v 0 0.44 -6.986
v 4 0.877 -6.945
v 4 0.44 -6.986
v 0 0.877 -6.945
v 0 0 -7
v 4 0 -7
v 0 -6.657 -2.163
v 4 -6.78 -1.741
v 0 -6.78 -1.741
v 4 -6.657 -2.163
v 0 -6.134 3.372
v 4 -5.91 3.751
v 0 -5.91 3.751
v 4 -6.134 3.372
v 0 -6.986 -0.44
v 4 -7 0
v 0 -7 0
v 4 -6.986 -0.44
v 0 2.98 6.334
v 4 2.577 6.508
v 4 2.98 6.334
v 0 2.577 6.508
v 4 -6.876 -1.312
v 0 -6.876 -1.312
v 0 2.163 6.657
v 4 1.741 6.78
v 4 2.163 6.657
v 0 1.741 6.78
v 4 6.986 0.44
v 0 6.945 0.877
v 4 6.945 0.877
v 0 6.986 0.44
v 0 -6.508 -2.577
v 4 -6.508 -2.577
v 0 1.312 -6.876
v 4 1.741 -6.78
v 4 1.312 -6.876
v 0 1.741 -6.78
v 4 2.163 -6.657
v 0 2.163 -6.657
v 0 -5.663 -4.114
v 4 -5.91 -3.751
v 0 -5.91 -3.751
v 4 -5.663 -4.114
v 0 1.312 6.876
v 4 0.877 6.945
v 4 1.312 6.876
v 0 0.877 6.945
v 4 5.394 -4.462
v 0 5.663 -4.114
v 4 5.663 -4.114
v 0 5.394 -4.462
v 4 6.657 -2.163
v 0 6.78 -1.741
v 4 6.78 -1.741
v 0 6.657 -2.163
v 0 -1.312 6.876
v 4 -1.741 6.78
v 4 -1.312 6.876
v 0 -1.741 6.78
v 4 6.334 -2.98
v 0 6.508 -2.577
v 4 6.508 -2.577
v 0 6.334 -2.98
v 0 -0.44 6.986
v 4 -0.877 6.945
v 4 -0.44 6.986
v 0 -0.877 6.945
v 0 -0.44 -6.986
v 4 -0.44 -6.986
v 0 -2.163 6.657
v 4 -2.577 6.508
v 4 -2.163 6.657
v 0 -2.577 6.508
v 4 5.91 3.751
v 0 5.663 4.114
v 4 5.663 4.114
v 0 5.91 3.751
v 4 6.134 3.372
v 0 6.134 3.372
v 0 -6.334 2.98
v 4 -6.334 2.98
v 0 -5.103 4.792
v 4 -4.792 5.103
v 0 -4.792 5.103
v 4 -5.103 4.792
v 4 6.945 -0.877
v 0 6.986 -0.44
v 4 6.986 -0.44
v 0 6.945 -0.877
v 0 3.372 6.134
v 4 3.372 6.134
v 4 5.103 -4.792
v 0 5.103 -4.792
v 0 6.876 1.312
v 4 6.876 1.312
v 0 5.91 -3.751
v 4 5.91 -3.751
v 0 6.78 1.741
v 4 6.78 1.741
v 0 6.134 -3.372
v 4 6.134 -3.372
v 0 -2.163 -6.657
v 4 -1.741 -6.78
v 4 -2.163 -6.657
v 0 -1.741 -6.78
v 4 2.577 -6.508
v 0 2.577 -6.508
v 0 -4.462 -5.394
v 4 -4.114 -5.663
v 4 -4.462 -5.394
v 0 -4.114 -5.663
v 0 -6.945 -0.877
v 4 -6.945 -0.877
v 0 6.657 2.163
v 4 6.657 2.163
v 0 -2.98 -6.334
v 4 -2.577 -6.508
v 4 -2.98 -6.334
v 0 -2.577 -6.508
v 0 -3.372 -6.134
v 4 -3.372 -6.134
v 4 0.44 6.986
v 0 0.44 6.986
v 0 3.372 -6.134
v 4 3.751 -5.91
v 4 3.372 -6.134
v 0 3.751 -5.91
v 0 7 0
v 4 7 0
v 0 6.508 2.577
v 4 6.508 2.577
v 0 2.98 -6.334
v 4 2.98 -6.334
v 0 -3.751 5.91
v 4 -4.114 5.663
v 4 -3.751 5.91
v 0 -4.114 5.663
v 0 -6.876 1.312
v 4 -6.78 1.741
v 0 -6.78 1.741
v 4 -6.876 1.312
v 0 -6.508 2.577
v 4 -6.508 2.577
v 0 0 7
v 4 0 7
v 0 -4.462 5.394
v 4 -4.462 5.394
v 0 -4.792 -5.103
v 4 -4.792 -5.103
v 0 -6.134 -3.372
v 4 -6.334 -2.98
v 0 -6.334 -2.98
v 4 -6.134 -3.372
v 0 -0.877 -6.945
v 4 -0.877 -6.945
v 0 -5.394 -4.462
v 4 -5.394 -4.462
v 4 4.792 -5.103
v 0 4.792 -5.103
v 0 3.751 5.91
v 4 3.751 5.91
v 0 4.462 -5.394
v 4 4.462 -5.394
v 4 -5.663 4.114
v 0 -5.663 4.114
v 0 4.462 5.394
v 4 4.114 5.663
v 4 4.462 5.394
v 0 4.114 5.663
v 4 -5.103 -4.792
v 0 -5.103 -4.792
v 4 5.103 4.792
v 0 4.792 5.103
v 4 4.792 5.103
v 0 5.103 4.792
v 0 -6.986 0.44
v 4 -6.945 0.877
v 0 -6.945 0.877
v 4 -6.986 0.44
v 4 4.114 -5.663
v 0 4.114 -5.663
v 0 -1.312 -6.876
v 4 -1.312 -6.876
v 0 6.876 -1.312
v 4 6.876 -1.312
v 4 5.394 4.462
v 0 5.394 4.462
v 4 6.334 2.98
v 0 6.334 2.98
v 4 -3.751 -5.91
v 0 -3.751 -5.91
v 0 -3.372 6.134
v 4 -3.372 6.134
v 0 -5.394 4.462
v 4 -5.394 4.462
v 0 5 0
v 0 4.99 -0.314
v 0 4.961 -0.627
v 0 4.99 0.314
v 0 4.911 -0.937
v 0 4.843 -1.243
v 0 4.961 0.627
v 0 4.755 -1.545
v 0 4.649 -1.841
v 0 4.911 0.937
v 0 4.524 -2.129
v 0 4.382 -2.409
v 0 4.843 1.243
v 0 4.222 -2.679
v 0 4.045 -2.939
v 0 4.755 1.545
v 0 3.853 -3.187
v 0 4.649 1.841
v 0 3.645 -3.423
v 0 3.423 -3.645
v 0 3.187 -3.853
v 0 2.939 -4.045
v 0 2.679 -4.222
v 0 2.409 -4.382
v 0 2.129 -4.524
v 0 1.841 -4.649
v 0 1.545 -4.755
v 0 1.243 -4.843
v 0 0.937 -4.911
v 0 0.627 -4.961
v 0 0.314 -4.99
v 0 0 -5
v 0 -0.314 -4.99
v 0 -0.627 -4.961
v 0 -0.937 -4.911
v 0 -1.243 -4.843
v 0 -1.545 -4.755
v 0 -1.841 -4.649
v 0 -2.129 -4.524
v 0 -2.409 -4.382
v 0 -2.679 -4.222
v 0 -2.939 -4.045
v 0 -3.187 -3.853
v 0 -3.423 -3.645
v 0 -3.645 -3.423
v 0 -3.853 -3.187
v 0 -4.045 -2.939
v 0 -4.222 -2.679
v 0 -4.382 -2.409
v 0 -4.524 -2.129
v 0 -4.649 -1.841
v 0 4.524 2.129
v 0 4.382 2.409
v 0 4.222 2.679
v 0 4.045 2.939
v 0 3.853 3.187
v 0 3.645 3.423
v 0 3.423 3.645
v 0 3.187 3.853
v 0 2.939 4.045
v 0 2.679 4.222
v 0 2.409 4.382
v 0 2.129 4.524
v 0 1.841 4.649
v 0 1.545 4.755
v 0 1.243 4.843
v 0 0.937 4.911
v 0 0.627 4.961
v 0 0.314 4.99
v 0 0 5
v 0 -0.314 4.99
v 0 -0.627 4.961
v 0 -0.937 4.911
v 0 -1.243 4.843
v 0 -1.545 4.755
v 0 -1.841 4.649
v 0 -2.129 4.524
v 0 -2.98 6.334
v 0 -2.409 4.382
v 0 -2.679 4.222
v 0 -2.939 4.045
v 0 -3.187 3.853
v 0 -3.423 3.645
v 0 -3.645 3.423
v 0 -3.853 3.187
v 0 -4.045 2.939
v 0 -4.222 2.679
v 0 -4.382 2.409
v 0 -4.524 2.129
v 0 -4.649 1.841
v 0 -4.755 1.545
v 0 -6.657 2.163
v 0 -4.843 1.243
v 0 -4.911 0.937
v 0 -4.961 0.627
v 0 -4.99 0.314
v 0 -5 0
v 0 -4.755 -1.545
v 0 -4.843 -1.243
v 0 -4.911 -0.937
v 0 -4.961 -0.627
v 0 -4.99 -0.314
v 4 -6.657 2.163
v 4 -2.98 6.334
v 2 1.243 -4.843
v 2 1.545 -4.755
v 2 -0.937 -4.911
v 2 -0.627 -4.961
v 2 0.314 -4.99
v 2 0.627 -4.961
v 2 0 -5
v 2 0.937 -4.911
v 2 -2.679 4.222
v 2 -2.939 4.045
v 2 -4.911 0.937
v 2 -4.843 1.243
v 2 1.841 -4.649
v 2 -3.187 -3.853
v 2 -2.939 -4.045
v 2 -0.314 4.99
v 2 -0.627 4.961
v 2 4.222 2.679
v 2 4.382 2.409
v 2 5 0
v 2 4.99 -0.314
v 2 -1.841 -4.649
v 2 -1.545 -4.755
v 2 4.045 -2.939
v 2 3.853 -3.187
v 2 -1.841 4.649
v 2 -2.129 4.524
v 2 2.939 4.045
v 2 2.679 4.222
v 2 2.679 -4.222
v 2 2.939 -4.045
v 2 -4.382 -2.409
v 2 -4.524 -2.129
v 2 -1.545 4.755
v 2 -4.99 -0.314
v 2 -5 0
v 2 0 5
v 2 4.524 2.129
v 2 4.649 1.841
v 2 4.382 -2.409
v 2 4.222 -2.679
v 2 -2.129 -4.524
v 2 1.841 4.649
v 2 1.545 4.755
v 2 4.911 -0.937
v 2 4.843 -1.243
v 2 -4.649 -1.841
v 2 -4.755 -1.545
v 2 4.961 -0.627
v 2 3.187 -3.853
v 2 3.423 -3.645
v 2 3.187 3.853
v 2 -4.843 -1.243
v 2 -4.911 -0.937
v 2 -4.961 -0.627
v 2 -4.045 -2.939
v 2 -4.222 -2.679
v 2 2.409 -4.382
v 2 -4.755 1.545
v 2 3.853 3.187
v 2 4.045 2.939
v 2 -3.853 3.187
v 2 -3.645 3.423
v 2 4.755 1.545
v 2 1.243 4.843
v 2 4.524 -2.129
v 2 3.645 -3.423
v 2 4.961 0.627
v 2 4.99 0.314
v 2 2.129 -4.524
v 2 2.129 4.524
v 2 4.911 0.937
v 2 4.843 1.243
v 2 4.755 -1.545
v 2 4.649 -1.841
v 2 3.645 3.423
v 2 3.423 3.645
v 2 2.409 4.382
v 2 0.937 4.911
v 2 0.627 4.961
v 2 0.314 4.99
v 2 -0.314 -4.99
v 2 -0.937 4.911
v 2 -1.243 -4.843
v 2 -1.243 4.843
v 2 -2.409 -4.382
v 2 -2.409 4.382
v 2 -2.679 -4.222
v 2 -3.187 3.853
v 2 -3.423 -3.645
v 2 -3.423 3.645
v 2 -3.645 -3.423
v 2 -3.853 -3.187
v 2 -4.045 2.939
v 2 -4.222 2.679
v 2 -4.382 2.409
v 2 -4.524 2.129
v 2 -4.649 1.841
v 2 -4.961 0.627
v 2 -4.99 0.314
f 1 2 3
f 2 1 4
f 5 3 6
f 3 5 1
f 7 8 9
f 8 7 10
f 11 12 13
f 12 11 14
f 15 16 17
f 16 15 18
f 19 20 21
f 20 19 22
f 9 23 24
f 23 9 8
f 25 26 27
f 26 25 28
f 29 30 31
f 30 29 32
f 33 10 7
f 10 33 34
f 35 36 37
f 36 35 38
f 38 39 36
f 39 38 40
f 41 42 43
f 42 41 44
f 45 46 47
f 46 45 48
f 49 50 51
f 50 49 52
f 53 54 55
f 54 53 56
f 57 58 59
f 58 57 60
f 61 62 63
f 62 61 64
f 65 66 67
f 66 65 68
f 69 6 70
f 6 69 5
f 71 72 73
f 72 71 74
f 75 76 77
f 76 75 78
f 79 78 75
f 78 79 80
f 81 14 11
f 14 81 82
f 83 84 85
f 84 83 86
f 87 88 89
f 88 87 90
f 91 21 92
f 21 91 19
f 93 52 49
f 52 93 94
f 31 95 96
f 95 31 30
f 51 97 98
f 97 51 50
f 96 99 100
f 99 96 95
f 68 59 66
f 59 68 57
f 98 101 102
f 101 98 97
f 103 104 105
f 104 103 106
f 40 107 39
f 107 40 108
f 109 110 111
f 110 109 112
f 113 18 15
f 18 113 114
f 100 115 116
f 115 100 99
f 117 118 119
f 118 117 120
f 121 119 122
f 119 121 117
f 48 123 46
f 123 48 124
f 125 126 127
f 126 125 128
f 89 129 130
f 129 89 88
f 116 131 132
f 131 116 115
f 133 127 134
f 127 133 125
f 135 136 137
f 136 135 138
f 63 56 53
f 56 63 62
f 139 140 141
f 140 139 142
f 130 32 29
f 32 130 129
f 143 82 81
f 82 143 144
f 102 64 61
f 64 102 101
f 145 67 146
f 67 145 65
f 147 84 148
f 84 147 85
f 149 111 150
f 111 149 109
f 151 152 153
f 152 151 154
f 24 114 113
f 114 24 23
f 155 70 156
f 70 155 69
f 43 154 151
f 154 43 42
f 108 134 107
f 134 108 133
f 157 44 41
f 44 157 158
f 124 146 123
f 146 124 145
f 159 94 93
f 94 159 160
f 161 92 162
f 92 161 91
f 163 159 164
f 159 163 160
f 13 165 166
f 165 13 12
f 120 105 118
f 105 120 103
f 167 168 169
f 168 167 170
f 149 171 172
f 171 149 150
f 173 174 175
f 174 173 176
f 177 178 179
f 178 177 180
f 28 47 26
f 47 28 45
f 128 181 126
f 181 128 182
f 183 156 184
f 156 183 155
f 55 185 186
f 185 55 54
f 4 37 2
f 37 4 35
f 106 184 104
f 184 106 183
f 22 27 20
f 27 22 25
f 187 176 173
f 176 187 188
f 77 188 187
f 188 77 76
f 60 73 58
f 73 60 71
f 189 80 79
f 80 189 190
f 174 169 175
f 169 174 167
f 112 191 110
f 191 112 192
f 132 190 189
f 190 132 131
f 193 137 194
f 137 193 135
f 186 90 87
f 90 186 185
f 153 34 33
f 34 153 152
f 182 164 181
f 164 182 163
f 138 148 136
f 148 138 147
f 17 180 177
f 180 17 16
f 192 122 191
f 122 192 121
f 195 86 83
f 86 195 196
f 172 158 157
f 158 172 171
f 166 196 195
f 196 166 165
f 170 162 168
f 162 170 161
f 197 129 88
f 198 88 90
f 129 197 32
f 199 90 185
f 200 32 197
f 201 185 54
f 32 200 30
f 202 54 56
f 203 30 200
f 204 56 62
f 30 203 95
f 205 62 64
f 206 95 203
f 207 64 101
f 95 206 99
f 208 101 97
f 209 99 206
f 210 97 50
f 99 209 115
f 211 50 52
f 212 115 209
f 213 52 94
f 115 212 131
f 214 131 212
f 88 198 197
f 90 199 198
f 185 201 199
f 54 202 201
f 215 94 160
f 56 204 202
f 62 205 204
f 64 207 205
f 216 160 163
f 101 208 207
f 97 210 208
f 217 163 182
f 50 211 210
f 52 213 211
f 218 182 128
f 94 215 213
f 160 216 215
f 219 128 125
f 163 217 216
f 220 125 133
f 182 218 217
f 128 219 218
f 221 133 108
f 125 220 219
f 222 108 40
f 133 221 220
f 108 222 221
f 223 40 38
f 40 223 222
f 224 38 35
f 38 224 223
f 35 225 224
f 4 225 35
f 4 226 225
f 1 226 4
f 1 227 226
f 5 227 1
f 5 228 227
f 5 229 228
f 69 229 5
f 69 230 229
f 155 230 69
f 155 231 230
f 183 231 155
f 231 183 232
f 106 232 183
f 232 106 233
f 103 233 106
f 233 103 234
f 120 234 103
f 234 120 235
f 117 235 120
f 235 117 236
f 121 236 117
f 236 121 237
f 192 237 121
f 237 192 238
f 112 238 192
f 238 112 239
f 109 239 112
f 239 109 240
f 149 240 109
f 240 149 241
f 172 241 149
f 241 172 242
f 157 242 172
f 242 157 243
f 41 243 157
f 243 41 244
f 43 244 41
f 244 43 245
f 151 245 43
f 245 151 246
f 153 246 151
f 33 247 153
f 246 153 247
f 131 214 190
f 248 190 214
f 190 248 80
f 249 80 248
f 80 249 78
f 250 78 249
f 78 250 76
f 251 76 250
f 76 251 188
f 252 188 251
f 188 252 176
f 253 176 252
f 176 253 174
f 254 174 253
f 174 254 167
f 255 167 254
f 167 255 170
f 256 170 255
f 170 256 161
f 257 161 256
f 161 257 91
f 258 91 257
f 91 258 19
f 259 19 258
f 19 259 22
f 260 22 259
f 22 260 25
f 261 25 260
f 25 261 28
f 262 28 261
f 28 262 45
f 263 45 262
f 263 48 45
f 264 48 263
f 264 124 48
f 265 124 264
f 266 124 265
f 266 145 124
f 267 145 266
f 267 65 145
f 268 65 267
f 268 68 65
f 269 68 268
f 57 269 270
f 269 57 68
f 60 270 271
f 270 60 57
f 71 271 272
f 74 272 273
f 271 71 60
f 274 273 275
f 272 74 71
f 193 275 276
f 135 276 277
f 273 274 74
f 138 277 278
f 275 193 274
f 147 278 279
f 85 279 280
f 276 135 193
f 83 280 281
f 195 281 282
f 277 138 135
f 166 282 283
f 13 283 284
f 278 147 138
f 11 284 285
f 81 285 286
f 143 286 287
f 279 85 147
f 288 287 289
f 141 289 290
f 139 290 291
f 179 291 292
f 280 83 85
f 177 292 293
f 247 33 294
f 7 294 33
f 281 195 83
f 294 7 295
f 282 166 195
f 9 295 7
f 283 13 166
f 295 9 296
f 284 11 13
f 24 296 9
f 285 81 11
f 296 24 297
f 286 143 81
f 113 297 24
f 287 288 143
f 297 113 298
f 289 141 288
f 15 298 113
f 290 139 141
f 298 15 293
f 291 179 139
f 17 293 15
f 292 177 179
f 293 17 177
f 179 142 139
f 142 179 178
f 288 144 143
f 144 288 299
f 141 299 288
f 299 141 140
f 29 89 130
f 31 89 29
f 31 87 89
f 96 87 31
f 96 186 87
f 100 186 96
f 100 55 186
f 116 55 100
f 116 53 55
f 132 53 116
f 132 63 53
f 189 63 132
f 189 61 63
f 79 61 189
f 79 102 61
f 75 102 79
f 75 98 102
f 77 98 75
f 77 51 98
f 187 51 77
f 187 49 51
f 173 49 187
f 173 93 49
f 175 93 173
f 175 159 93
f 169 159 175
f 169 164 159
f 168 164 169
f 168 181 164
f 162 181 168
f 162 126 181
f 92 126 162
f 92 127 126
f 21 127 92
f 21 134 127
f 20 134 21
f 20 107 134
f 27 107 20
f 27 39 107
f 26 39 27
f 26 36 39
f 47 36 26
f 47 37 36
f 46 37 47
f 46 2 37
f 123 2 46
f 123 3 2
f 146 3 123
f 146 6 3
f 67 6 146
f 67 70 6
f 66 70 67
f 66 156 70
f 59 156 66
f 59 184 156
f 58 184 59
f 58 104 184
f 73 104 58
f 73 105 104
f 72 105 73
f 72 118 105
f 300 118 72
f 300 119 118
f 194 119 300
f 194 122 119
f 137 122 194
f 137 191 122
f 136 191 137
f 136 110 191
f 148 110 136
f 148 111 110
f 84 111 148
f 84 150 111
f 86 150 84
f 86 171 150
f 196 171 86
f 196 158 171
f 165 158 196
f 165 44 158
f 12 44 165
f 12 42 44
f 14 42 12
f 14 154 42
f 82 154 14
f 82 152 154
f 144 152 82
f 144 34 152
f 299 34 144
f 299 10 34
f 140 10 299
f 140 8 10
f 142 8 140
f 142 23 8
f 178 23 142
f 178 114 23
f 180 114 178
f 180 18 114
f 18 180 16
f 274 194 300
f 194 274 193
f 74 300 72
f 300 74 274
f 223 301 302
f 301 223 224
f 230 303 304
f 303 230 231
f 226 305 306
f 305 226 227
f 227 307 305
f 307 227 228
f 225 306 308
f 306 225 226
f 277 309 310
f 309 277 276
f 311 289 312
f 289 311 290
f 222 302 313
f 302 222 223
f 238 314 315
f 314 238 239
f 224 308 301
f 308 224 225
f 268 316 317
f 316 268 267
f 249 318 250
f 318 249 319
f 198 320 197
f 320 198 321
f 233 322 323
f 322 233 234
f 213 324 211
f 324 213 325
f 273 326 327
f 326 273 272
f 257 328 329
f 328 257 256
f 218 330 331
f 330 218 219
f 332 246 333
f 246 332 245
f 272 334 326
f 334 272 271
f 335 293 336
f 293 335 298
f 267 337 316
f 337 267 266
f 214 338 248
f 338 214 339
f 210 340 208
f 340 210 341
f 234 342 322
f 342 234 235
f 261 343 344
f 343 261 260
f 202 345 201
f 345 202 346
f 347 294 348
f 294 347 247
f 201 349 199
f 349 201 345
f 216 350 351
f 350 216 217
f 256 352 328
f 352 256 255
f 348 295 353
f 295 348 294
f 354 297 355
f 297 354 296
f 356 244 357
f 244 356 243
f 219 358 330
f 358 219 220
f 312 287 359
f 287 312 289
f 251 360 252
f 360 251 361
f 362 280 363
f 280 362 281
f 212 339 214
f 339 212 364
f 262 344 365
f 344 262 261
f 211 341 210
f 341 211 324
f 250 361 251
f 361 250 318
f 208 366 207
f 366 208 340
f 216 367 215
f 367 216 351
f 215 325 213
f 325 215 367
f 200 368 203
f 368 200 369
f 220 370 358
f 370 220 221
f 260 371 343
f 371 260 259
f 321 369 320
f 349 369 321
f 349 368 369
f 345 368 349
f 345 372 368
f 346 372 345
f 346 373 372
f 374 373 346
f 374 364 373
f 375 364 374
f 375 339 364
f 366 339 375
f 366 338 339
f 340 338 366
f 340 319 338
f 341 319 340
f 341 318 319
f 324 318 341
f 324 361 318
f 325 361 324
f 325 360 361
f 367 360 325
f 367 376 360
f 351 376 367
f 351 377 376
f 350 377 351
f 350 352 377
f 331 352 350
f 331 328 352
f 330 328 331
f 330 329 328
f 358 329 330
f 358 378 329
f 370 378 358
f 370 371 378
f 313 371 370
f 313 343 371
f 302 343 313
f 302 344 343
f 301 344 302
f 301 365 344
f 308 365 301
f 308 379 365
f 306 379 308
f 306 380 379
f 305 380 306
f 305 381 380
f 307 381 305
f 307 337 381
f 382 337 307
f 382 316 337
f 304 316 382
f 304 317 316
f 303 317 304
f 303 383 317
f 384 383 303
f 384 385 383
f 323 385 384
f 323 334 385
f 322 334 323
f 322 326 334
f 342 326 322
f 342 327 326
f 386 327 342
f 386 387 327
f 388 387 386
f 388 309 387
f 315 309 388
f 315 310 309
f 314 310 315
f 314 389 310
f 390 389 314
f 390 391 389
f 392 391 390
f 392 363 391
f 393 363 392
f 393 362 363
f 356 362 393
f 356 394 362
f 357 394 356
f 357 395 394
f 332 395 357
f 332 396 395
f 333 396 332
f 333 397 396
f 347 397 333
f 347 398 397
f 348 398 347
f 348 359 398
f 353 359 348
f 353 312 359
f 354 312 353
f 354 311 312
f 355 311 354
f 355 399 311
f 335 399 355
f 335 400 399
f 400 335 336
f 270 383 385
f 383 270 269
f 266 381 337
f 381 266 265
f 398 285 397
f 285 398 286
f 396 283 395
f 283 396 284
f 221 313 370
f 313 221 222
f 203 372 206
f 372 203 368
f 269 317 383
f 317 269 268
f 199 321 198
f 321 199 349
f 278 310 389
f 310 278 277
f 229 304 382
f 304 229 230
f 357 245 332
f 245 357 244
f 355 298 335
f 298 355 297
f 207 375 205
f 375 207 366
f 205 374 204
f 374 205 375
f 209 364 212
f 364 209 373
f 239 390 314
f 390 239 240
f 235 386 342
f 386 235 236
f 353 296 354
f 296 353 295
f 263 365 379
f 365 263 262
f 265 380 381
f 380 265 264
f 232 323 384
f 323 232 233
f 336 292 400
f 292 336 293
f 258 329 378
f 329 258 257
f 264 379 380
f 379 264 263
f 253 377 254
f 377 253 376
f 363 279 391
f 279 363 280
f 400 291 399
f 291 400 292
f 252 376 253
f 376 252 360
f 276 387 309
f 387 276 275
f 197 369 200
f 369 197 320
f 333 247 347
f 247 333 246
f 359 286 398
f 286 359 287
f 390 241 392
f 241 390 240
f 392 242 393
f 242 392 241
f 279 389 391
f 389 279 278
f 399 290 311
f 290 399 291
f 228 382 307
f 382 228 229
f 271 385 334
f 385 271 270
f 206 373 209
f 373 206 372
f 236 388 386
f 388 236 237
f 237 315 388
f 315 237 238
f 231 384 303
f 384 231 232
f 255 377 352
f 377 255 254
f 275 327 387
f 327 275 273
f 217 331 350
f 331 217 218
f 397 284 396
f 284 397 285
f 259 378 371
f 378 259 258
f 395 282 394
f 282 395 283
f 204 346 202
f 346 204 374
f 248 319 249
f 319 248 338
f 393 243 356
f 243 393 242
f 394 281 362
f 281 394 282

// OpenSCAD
$fn=100;

// fount wheels
Cap(4,5,7);

// double clip
//Cap(4,4,5.5);

// front wheel clips caps
//Cap(4,4,5.5);

module Cap(height, innerRadius, outerRadius){

	thickness = 3;

	rotate([0,90,0]){

		difference(){
			cylinder(h=height, r=outerRadius);
			cylinder(h=height-2, r=innerRadius);
		}
	}
}
